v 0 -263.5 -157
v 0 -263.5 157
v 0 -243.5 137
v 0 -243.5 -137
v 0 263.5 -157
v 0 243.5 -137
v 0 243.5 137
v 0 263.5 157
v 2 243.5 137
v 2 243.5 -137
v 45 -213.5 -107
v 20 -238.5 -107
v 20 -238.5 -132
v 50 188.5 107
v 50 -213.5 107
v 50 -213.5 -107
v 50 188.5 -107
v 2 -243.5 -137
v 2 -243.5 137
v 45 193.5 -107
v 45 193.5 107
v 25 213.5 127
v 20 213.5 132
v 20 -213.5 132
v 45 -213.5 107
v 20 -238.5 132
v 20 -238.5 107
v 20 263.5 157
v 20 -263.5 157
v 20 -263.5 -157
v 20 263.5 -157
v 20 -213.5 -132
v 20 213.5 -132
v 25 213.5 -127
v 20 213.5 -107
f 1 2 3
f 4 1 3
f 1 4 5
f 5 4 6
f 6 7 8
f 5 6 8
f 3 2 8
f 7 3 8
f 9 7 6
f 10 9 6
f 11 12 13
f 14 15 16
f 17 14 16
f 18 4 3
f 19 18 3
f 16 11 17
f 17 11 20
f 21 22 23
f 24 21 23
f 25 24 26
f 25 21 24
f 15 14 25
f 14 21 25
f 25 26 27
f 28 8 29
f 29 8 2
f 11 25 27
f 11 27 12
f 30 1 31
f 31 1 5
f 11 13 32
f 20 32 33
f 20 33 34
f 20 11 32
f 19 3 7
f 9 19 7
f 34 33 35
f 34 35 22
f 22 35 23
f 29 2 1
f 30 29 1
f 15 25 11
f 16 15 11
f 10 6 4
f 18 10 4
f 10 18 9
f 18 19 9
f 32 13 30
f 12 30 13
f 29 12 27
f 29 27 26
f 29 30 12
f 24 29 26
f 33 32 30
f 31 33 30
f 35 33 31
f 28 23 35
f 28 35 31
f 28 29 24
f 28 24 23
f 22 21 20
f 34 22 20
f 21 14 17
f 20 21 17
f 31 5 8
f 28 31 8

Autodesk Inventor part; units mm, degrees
ref_plane "YZ Plane" through (0, 0, 0) normal (1, 0, 0) x (0, 1, 0)
ref_plane "XZ Plane" through (0, 0, 0) normal (0, 1, 0) x (-1, 0, 0)
ref_plane "XY Plane" through (0, 0, 0) normal (0, 0, 1) x (1, 0, 0)
sketch "Sketch1" plane through (0, 0, 0) normal (1, 0, 0) x (0, 1, 0)
  line L0 (-243.5, 137) -> (243.5, 137)
  line L1 (243.5, 137) -> (243.5, -137)
  line L2 (243.5, -137) -> (-243.5, -137)
  line L3 (-243.5, -137) -> (-243.5, 137)
  line L4 (-243.5, 137) -> (243.5, -137) construction
  line L5 (243.5, 137) -> (-243.5, -137) construction
  line L6 (263.5, -157) -> (263.5, 157)
  line L7 (263.5, 157) -> (-263.5, 157)
  line L8 (-263.5, 157) -> (-263.5, -157)
  line L9 (-263.5, -157) -> (263.5, -157)
  point P0 (0, 0)
  dimension "d0" = 487
  dimension "d1" = 274
  dimension "d2" = 20
extrude "Extrusion1" add sketch "Sketch1" along normal blind 20 contours L0 L1 L2 L3 | L9 L8 L7 L6
extrude "Extrusion2" cut sketch "Sketch1" along normal blind 2 contours L0 L1 L2 L3
sketch "Sketch2" plane through (20, 0, 0) normal (1, 0, 0) x (0, 0, -1)
  line L0 (-157, 263.5) -> (-157, -263.5) projected
  line L1 (-157, -263.5) -> (157, -263.5) projected
  line L2 (157, -263.5) -> (157, 263.5) projected
  line L3 (157, 263.5) -> (-157, 263.5) projected
  line L4 (-107, 213.5) -> (-107, -213.5)
  line L5 (-107, -213.5) -> (107, -213.5)
  line L6 (107, -213.5) -> (107, 213.5)
  line L7 (107, 213.5) -> (-107, 213.5)
  point P0 (0, 0)
  dimension "d7" = 50
extrude "Extrusion3" add sketch "Sketch2" along normal blind 30 contours L7 L6 L5 L4
chamfer "Chamfer1" distance 25 angle 45 4 edges at (20, 0, -107) (50, 213.5, 0) (20, 0, 107) (20, -213.5, 0)
properties part number "DIMENSIONES_PANTALLA" material "Steel, Mild, Welded"
